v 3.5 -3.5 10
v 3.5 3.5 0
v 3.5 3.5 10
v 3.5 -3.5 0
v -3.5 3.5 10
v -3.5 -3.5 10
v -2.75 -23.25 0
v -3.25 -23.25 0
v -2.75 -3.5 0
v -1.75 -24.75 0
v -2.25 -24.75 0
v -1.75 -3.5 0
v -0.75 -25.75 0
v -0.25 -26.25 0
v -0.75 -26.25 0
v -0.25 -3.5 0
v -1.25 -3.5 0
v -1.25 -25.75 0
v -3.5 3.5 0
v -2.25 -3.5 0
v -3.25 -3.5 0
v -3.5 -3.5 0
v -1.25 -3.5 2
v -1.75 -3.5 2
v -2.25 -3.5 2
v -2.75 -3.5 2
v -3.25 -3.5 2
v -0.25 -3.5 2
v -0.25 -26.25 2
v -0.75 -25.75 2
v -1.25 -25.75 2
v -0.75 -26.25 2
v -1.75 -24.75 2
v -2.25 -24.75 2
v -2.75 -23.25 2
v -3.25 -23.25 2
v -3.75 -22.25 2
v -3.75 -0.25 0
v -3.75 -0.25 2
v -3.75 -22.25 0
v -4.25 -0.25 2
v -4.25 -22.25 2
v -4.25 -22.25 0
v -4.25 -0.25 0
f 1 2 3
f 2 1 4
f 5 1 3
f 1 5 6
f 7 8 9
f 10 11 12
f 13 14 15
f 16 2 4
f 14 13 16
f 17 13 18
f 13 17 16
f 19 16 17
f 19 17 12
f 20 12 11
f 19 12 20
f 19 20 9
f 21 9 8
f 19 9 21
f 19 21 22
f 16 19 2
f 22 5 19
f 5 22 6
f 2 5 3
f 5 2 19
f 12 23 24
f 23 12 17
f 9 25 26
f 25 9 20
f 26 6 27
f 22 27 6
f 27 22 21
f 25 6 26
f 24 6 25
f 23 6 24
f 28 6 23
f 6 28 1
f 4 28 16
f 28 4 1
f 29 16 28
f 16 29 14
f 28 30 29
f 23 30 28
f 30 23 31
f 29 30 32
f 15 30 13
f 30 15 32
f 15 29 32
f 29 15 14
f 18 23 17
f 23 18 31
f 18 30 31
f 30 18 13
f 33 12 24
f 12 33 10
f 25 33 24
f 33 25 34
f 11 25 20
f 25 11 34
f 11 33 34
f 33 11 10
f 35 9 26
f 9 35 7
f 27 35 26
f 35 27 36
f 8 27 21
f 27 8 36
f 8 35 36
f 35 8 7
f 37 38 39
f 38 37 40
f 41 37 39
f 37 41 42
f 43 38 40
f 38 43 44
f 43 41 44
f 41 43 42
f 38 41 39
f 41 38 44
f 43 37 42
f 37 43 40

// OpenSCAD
translate([0, 0, 5]) color([0,1,0,0.9]) cube([7, 7, 10], center=true);
translate([-0.5, -0.5, 1]) color([1,0,0]) cube([0.5, 0.5, 2], center=true);
translate([-0.5, -1.0, 1]) color([1,0,0]) cube([0.5, 0.5, 2], center=true);
translate([-0.5, -1.5, 1]) color([1,0,0]) cube([0.5, 0.5, 2], center=true);
translate([-0.5, -2.0, 1]) color([1,0,0]) cube([0.5, 0.5, 2], center=true);
translate([-0.5, -2.5, 1]) color([1,0,0]) cube([0.5, 0.5, 2], center=true);
translate([-0.5, -3.0, 1]) color([1,0,0]) cube([0.5, 0.5, 2], center=true);
translate([-0.5, -3.5, 1]) color([1,0,0]) cube([0.5, 0.5, 2], center=true);
translate([-0.5, -4.0, 1]) color([1,0,0]) cube([0.5, 0.5, 2], center=true);
translate([-0.5, -4.5, 1]) color([1,0,0]) cube([0.5, 0.5, 2], center=true);
translate([-0.5, -5.0, 1]) color([1,0,0]) cube([0.5, 0.5, 2], center=true);
translate([-0.5, -5.5, 1]) color([1,0,0]) cube([0.5, 0.5, 2], center=true);
translate([-0.5, -6.0, 1]) color([1,0,0]) cube([0.5, 0.5, 2], center=true);
translate([-0.5, -6.5, 1]) color([1,0,0]) cube([0.5, 0.5, 2], center=true);
translate([-0.5, -7.0, 1]) color([1,0,0]) cube([0.5, 0.5, 2], center=true);
translate([-0.5, -7.5, 1]) color([1,0,0]) cube([0.5, 0.5, 2], center=true);
translate([-0.5, -8.0, 1]) color([1,0,0]) cube([0.5, 0.5, 2], center=true);
translate([-0.5, -8.5, 1]) color([1,0,0]) cube([0.5, 0.5, 2], center=true);
translate([-0.5, -9.0, 1]) color([1,0,0]) cube([0.5, 0.5, 2], center=true);
translate([-0.5, -9.5, 1]) color([1,0,0]) cube([0.5, 0.5, 2], center=true);
translate([-0.5, -10.0, 1]) color([1,0,0]) cube([0.5, 0.5, 2], center=true);
translate([-0.5, -10.5, 1]) color([1,0,0]) cube([0.5, 0.5, 2], center=true);
translate([-0.5, -11.0, 1]) color([1,0,0]) cube([0.5, 0.5, 2], center=true);
translate([-0.5, -11.5, 1]) color([1,0,0]) cube([0.5, 0.5, 2], center=true);
translate([-0.5, -12.0, 1]) color([1,0,0]) cube([0.5, 0.5, 2], center=true);
translate([-0.5, -12.5, 1]) color([1,0,0]) cube([0.5, 0.5, 2], center=true);
translate([-0.5, -13.0, 1]) color([1,0,0]) cube([0.5, 0.5, 2], center=true);
translate([-0.5, -13.5, 1]) color([1,0,0]) cube([0.5, 0.5, 2], center=true);
translate([-0.5, -14.0, 1]) color([1,0,0]) cube([0.5, 0.5, 2], center=true);
translate([-0.5, -14.5, 1]) color([1,0,0]) cube([0.5, 0.5, 2], center=true);
translate([-0.5, -15.0, 1]) color([1,0,0]) cube([0.5, 0.5, 2], center=true);
translate([-0.5, -15.5, 1]) color([1,0,0]) cube([0.5, 0.5, 2], center=true);
translate([-0.5, -16.0, 1]) color([1,0,0]) cube([0.5, 0.5, 2], center=true);
translate([-0.5, -16.5, 1]) color([1,0,0]) cube([0.5, 0.5, 2], center=true);
translate([-0.5, -17.0, 1]) color([1,0,0]) cube([0.5, 0.5, 2], center=true);
translate([-0.5, -17.5, 1]) color([1,0,0]) cube([0.5, 0.5, 2], center=true);
translate([-0.5, -18.0, 1]) color([1,0,0]) cube([0.5, 0.5, 2], center=true);
translate([-0.5, -18.5, 1]) color([1,0,0]) cube([0.5, 0.5, 2], center=true);
translate([-0.5, -19.0, 1]) color([1,0,0]) cube([0.5, 0.5, 2], center=true);
translate([-0.5, -19.5, 1]) color([1,0,0]) cube([0.5, 0.5, 2], center=true);
translate([-0.5, -20.0, 1]) color([1,0,0]) cube([0.5, 0.5, 2], center=true);
translate([-0.5, -20.5, 1]) color([1,0,0]) cube([0.5, 0.5, 2], center=true);
translate([-0.5, -21.0, 1]) color([1,0,0]) cube([0.5, 0.5, 2], center=true);
translate([-0.5, -21.5, 1]) color([1,0,0]) cube([0.5, 0.5, 2], center=true);
translate([-0.5, -22.0, 1]) color([1,0,0]) cube([0.5, 0.5, 2], center=true);
translate([-0.5, -22.5, 1]) color([1,0,0]) cube([0.5, 0.5, 2], center=true);
translate([-0.5, -23.0, 1]) color([1,0,0]) cube([0.5, 0.5, 2], center=true);
translate([-0.5, -23.5, 1]) color([1,0,0]) cube([0.5, 0.5, 2], center=true);
translate([-0.5, -24.0, 1]) color([1,0,0]) cube([0.5, 0.5, 2], center=true);
translate([-0.5, -24.5, 1]) color([1,0,0]) cube([0.5, 0.5, 2], center=true);
translate([-0.5, -25.0, 1]) color([1,0,0]) cube([0.5, 0.5, 2], center=true);
translate([-0.5, -25.5, 1]) color([1,0,0]) cube([0.5, 0.5, 2], center=true);
translate([-0.5, -26.0, 1]) color([1,0,0]) cube([0.5, 0.5, 2], center=true);
translate([-1.0, -0.5, 1]) color([1,0,0]) cube([0.5, 0.5, 2], center=true);
translate([-1.0, -1.0, 1]) color([1,0,0]) cube([0.5, 0.5, 2], center=true);
translate([-1.0, -1.5, 1]) color([1,0,0]) cube([0.5, 0.5, 2], center=true);
translate([-1.0, -2.0, 1]) color([1,0,0]) cube([0.5, 0.5, 2], center=true);
translate([-1.0, -2.5, 1]) color([1,0,0]) cube([0.5, 0.5, 2], center=true);
translate([-1.0, -3.0, 1]) color([1,0,0]) cube([0.5, 0.5, 2], center=true);
translate([-1.0, -3.5, 1]) color([1,0,0]) cube([0.5, 0.5, 2], center=true);
translate([-1.0, -4.0, 1]) color([1,0,0]) cube([0.5, 0.5, 2], center=true);
translate([-1.0, -4.5, 1]) color([1,0,0]) cube([0.5, 0.5, 2], center=true);
translate([-1.0, -5.0, 1]) color([1,0,0]) cube([0.5, 0.5, 2], center=true);
translate([-1.0, -5.5, 1]) color([1,0,0]) cube([0.5, 0.5, 2], center=true);
translate([-1.0, -6.0, 1]) color([1,0,0]) cube([0.5, 0.5, 2], center=true);
translate([-1.0, -6.5, 1]) color([1,0,0]) cube([0.5, 0.5, 2], center=true);
translate([-1.0, -7.0, 1]) color([1,0,0]) cube([0.5, 0.5, 2], center=true);
translate([-1.0, -7.5, 1]) color([1,0,0]) cube([0.5, 0.5, 2], center=true);
translate([-1.0, -8.0, 1]) color([1,0,0]) cube([0.5, 0.5, 2], center=true);
translate([-1.0, -8.5, 1]) color([1,0,0]) cube([0.5, 0.5, 2], center=true);
translate([-1.0, -9.0, 1]) color([1,0,0]) cube([0.5, 0.5, 2], center=true);
translate([-1.0, -9.5, 1]) color([1,0,0]) cube([0.5, 0.5, 2], center=true);
translate([-1.0, -10.0, 1]) color([1,0,0]) cube([0.5, 0.5, 2], center=true);
translate([-1.0, -10.5, 1]) color([1,0,0]) cube([0.5, 0.5, 2], center=true);
translate([-1.0, -11.0, 1]) color([1,0,0]) cube([0.5, 0.5, 2], center=true);
translate([-1.0, -11.5, 1]) color([1,0,0]) cube([0.5, 0.5, 2], center=true);
translate([-1.0, -12.0, 1]) color([1,0,0]) cube([0.5, 0.5, 2], center=true);
translate([-1.0, -12.5, 1]) color([1,0,0]) cube([0.5, 0.5, 2], center=true);
translate([-1.0, -13.0, 1]) color([1,0,0]) cube([0.5, 0.5, 2], center=true);
translate([-1.0, -13.5, 1]) color([1,0,0]) cube([0.5, 0.5, 2], center=true);
translate([-1.0, -14.0, 1]) color([1,0,0]) cube([0.5, 0.5, 2], center=true);
translate([-1.0, -14.5, 1]) color([1,0,0]) cube([0.5, 0.5, 2], center=true);
translate([-1.0, -15.0, 1]) color([1,0,0]) cube([0.5, 0.5, 2], center=true);
translate([-1.0, -15.5, 1]) color([1,0,0]) cube([0.5, 0.5, 2], center=true);
translate([-1.0, -16.0, 1]) color([1,0,0]) cube([0.5, 0.5, 2], center=true);
translate([-1.0, -16.5, 1]) color([1,0,0]) cube([0.5, 0.5, 2], center=true);
translate([-1.0, -17.0, 1]) color([1,0,0]) cube([0.5, 0.5, 2], center=true);
translate([-1.0, -17.5, 1]) color([1,0,0]) cube([0.5, 0.5, 2], center=true);
translate([-1.0, -18.0, 1]) color([1,0,0]) cube([0.5, 0.5, 2], center=true);
translate([-1.0, -18.5, 1]) color([1,0,0]) cube([0.5, 0.5, 2], center=true);
translate([-1.0, -19.0, 1]) color([1,0,0]) cube([0.5, 0.5, 2], center=true);
translate([-1.0, -19.5, 1]) color([1,0,0]) cube([0.5, 0.5, 2], center=true);
translate([-1.0, -20.0, 1]) color([1,0,0]) cube([0.5, 0.5, 2], center=true);
translate([-1.0, -20.5, 1]) color([1,0,0]) cube([0.5, 0.5, 2], center=true);
translate([-1.0, -21.0, 1]) color([1,0,0]) cube([0.5, 0.5, 2], center=true);
translate([-1.0, -21.5, 1]) color([1,0,0]) cube([0.5, 0.5, 2], center=true);
translate([-1.0, -22.0, 1]) color([1,0,0]) cube([0.5, 0.5, 2], center=true);
translate([-1.0, -22.5, 1]) color([1,0,0]) cube([0.5, 0.5, 2], center=true);
translate([-1.0, -23.0, 1]) color([1,0,0]) cube([0.5, 0.5, 2], center=true);
translate([-1.0, -23.5, 1]) color([1,0,0]) cube([0.5, 0.5, 2], center=true);
translate([-1.0, -24.0, 1]) color([1,0,0]) cube([0.5, 0.5, 2], center=true);
translate([-1.0, -24.5, 1]) color([1,0,0]) cube([0.5, 0.5, 2], center=true);
translate([-1.0, -25.0, 1]) color([1,0,0]) cube([0.5, 0.5, 2], center=true);
translate([-1.0, -25.5, 1]) color([1,0,0]) cube([0.5, 0.5, 2], center=true);
translate([-2.0, -0.5, 1]) color([1,0,0]) cube([0.5, 0.5, 2], center=true);
translate([-2.0, -1.0, 1]) color([1,0,0]) cube([0.5, 0.5, 2], center=true);
translate([-2.0, -1.5, 1]) color([1,0,0]) cube([0.5, 0.5, 2], center=true);
translate([-2.0, -2.0, 1]) color([1,0,0]) cube([0.5, 0.5, 2], center=true);
translate([-2.0, -2.5, 1]) color([1,0,0]) cube([0.5, 0.5, 2], center=true);
translate([-2.0, -3.0, 1]) color([1,0,0]) cube([0.5, 0.5, 2], center=true);
translate([-2.0, -3.5, 1]) color([1,0,0]) cube([0.5, 0.5, 2], center=true);
translate([-2.0, -4.0, 1]) color([1,0,0]) cube([0.5, 0.5, 2], center=true);
translate([-2.0, -4.5, 1]) color([1,0,0]) cube([0.5, 0.5, 2], center=true);
translate([-2.0, -5.0, 1]) color([1,0,0]) cube([0.5, 0.5, 2], center=true);
translate([-2.0, -5.5, 1]) color([1,0,0]) cube([0.5, 0.5, 2], center=true);
translate([-2.0, -6.0, 1]) color([1,0,0]) cube([0.5, 0.5, 2], center=true);
translate([-2.0, -6.5, 1]) color([1,0,0]) cube([0.5, 0.5, 2], center=true);
translate([-2.0, -7.0, 1]) color([1,0,0]) cube([0.5, 0.5, 2], center=true);
translate([-2.0, -7.5, 1]) color([1,0,0]) cube([0.5, 0.5, 2], center=true);
translate([-2.0, -8.0, 1]) color([1,0,0]) cube([0.5, 0.5, 2], center=true);
translate([-2.0, -8.5, 1]) color([1,0,0]) cube([0.5, 0.5, 2], center=true);
translate([-2.0, -9.0, 1]) color([1,0,0]) cube([0.5, 0.5, 2], center=true);
translate([-2.0, -9.5, 1]) color([1,0,0]) cube([0.5, 0.5, 2], center=true);
translate([-2.0, -10.0, 1]) color([1,0,0]) cube([0.5, 0.5, 2], center=true);
translate([-2.0, -10.5, 1]) color([1,0,0]) cube([0.5, 0.5, 2], center=true);
translate([-2.0, -11.0, 1]) color([1,0,0]) cube([0.5, 0.5, 2], center=true);
translate([-2.0, -11.5, 1]) color([1,0,0]) cube([0.5, 0.5, 2], center=true);
translate([-2.0, -12.0, 1]) color([1,0,0]) cube([0.5, 0.5, 2], center=true);
translate([-2.0, -12.5, 1]) color([1,0,0]) cube([0.5, 0.5, 2], center=true);
translate([-2.0, -13.0, 1]) color([1,0,0]) cube([0.5, 0.5, 2], center=true);
translate([-2.0, -13.5, 1]) color([1,0,0]) cube([0.5, 0.5, 2], center=true);
translate([-2.0, -14.0, 1]) color([1,0,0]) cube([0.5, 0.5, 2], center=true);
translate([-2.0, -14.5, 1]) color([1,0,0]) cube([0.5, 0.5, 2], center=true);
translate([-2.0, -15.0, 1]) color([1,0,0]) cube([0.5, 0.5, 2], center=true);
translate([-2.0, -15.5, 1]) color([1,0,0]) cube([0.5, 0.5, 2], center=true);
translate([-2.0, -16.0, 1]) color([1,0,0]) cube([0.5, 0.5, 2], center=true);
translate([-2.0, -16.5, 1]) color([1,0,0]) cube([0.5, 0.5, 2], center=true);
translate([-2.0, -17.0, 1]) color([1,0,0]) cube([0.5, 0.5, 2], center=true);
translate([-2.0, -17.5, 1]) color([1,0,0]) cube([0.5, 0.5, 2], center=true);
translate([-2.0, -18.0, 1]) color([1,0,0]) cube([0.5, 0.5, 2], center=true);
translate([-2.0, -18.5, 1]) color([1,0,0]) cube([0.5, 0.5, 2], center=true);
translate([-2.0, -19.0, 1]) color([1,0,0]) cube([0.5, 0.5, 2], center=true);
translate([-2.0, -19.5, 1]) color([1,0,0]) cube([0.5, 0.5, 2], center=true);
translate([-2.0, -20.0, 1]) color([1,0,0]) cube([0.5, 0.5, 2], center=true);
translate([-2.0, -20.5, 1]) color([1,0,0]) cube([0.5, 0.5, 2], center=true);
translate([-2.0, -21.0, 1]) color([1,0,0]) cube([0.5, 0.5, 2], center=true);
translate([-2.0, -21.5, 1]) color([1,0,0]) cube([0.5, 0.5, 2], center=true);
translate([-2.0, -22.0, 1]) color([1,0,0]) cube([0.5, 0.5, 2], center=true);
translate([-2.0, -22.5, 1]) color([1,0,0]) cube([0.5, 0.5, 2], center=true);
translate([-2.0, -23.0, 1]) color([1,0,0]) cube([0.5, 0.5, 2], center=true);
translate([-2.0, -23.5, 1]) color([1,0,0]) cube([0.5, 0.5, 2], center=true);
translate([-2.0, -24.0, 1]) color([1,0,0]) cube([0.5, 0.5, 2], center=true);
translate([-2.0, -24.5, 1]) color([1,0,0]) cube([0.5, 0.5, 2], center=true);
translate([-3.0, -0.5, 1]) color([1,0,0]) cube([0.5, 0.5, 2], center=true);
translate([-3.0, -1.0, 1]) color([1,0,0]) cube([0.5, 0.5, 2], center=true);
translate([-3.0, -1.5, 1]) color([1,0,0]) cube([0.5, 0.5, 2], center=true);
translate([-3.0, -2.0, 1]) color([1,0,0]) cube([0.5, 0.5, 2], center=true);
translate([-3.0, -2.5, 1]) color([1,0,0]) cube([0.5, 0.5, 2], center=true);
translate([-3.0, -3.0, 1]) color([1,0,0]) cube([0.5, 0.5, 2], center=true);
translate([-3.0, -3.5, 1]) color([1,0,0]) cube([0.5, 0.5, 2], center=true);
translate([-3.0, -4.0, 1]) color([1,0,0]) cube([0.5, 0.5, 2], center=true);
translate([-3.0, -4.5, 1]) color([1,0,0]) cube([0.5, 0.5, 2], center=true);
translate([-3.0, -5.0, 1]) color([1,0,0]) cube([0.5, 0.5, 2], center=true);
translate([-3.0, -5.5, 1]) color([1,0,0]) cube([0.5, 0.5, 2], center=true);
translate([-3.0, -6.0, 1]) color([1,0,0]) cube([0.5, 0.5, 2], center=true);
translate([-3.0, -6.5, 1]) color([1,0,0]) cube([0.5, 0.5, 2], center=true);
translate([-3.0, -7.0, 1]) color([1,0,0]) cube([0.5, 0.5, 2], center=true);
translate([-3.0, -7.5, 1]) color([1,0,0]) cube([0.5, 0.5, 2], center=true);
translate([-3.0, -8.0, 1]) color([1,0,0]) cube([0.5, 0.5, 2], center=true);
translate([-3.0, -8.5, 1]) color([1,0,0]) cube([0.5, 0.5, 2], center=true);
translate([-3.0, -9.0, 1]) color([1,0,0]) cube([0.5, 0.5, 2], center=true);
translate([-3.0, -9.5, 1]) color([1,0,0]) cube([0.5, 0.5, 2], center=true);
translate([-3.0, -10.0, 1]) color([1,0,0]) cube([0.5, 0.5, 2], center=true);
translate([-3.0, -10.5, 1]) color([1,0,0]) cube([0.5, 0.5, 2], center=true);
translate([-3.0, -11.0, 1]) color([1,0,0]) cube([0.5, 0.5, 2], center=true);
translate([-3.0, -11.5, 1]) color([1,0,0]) cube([0.5, 0.5, 2], center=true);
translate([-3.0, -12.0, 1]) color([1,0,0]) cube([0.5, 0.5, 2], center=true);
translate([-3.0, -12.5, 1]) color([1,0,0]) cube([0.5, 0.5, 2], center=true);
translate([-3.0, -13.0, 1]) color([1,0,0]) cube([0.5, 0.5, 2], center=true);
translate([-3.0, -13.5, 1]) color([1,0,0]) cube([0.5, 0.5, 2], center=true);
translate([-3.0, -14.0, 1]) color([1,0,0]) cube([0.5, 0.5, 2], center=true);
translate([-3.0, -14.5, 1]) color([1,0,0]) cube([0.5, 0.5, 2], center=true);
translate([-3.0, -15.0, 1]) color([1,0,0]) cube([0.5, 0.5, 2], center=true);
translate([-3.0, -15.5, 1]) color([1,0,0]) cube([0.5, 0.5, 2], center=true);
translate([-3.0, -16.0, 1]) color([1,0,0]) cube([0.5, 0.5, 2], center=true);
translate([-3.0, -16.5, 1]) color([1,0,0]) cube([0.5, 0.5, 2], center=true);
translate([-3.0, -17.0, 1]) color([1,0,0]) cube([0.5, 0.5, 2], center=true);
translate([-3.0, -17.5, 1]) color([1,0,0]) cube([0.5, 0.5, 2], center=true);
translate([-3.0, -18.0, 1]) color([1,0,0]) cube([0.5, 0.5, 2], center=true);
translate([-3.0, -18.5, 1]) color([1,0,0]) cube([0.5, 0.5, 2], center=true);
translate([-3.0, -19.0, 1]) color([1,0,0]) cube([0.5, 0.5, 2], center=true);
translate([-3.0, -19.5, 1]) color([1,0,0]) cube([0.5, 0.5, 2], center=true);
translate([-3.0, -20.0, 1]) color([1,0,0]) cube([0.5, 0.5, 2], center=true);
translate([-3.0, -20.5, 1]) color([1,0,0]) cube([0.5, 0.5, 2], center=true);
translate([-3.0, -21.0, 1]) color([1,0,0]) cube([0.5, 0.5, 2], center=true);
translate([-3.0, -21.5, 1]) color([1,0,0]) cube([0.5, 0.5, 2], center=true);
translate([-3.0, -22.0, 1]) color([1,0,0]) cube([0.5, 0.5, 2], center=true);
translate([-3.0, -22.5, 1]) color([1,0,0]) cube([0.5, 0.5, 2], center=true);
translate([-3.0, -23.0, 1]) color([1,0,0]) cube([0.5, 0.5, 2], center=true);
translate([-4.0, -0.5, 1]) color([1,0,0]) cube([0.5, 0.5, 2], center=true);
translate([-4.0, -1.0, 1]) color([1,0,0]) cube([0.5, 0.5, 2], center=true);
translate([-4.0, -1.5, 1]) color([1,0,0]) cube([0.5, 0.5, 2], center=true);
translate([-4.0, -2.0, 1]) color([1,0,0]) cube([0.5, 0.5, 2], center=true);
translate([-4.0, -2.5, 1]) color([1,0,0]) cube([0.5, 0.5, 2], center=true);
translate([-4.0, -3.0, 1]) color([1,0,0]) cube([0.5, 0.5, 2], center=true);
translate([-4.0, -3.5, 1]) color([1,0,0]) cube([0.5, 0.5, 2], center=true);
translate([-4.0, -4.0, 1]) color([1,0,0]) cube([0.5, 0.5, 2], center=true);
translate([-4.0, -4.5, 1]) color([1,0,0]) cube([0.5, 0.5, 2], center=true);
translate([-4.0, -5.0, 1]) color([1,0,0]) cube([0.5, 0.5, 2], center=true);
translate([-4.0, -5.5, 1]) color([1,0,0]) cube([0.5, 0.5, 2], center=true);
translate([-4.0, -6.0, 1]) color([1,0,0]) cube([0.5, 0.5, 2], center=true);
translate([-4.0, -6.5, 1]) color([1,0,0]) cube([0.5, 0.5, 2], center=true);
translate([-4.0, -7.0, 1]) color([1,0,0]) cube([0.5, 0.5, 2], center=true);
translate([-4.0, -7.5, 1]) color([1,0,0]) cube([0.5, 0.5, 2], center=true);
translate([-4.0, -8.0, 1]) color([1,0,0]) cube([0.5, 0.5, 2], center=true);
translate([-4.0, -8.5, 1]) color([1,0,0]) cube([0.5, 0.5, 2], center=true);
translate([-4.0, -9.0, 1]) color([1,0,0]) cube([0.5, 0.5, 2], center=true);
translate([-4.0, -9.5, 1]) color([1,0,0]) cube([0.5, 0.5, 2], center=true);
translate([-4.0, -10.0, 1]) color([1,0,0]) cube([0.5, 0.5, 2], center=true);
translate([-4.0, -10.5, 1]) color([1,0,0]) cube([0.5, 0.5, 2], center=true);
translate([-4.0, -11.0, 1]) color([1,0,0]) cube([0.5, 0.5, 2], center=true);
translate([-4.0, -11.5, 1]) color([1,0,0]) cube([0.5, 0.5, 2], center=true);
translate([-4.0, -12.0, 1]) color([1,0,0]) cube([0.5, 0.5, 2], center=true);
translate([-4.0, -12.5, 1]) color([1,0,0]) cube([0.5, 0.5, 2], center=true);
translate([-4.0, -13.0, 1]) color([1,0,0]) cube([0.5, 0.5, 2], center=true);
translate([-4.0, -13.5, 1]) color([1,0,0]) cube([0.5, 0.5, 2], center=true);
translate([-4.0, -14.0, 1]) color([1,0,0]) cube([0.5, 0.5, 2], center=true);
translate([-4.0, -14.5, 1]) color([1,0,0]) cube([0.5, 0.5, 2], center=true);
translate([-4.0, -15.0, 1]) color([1,0,0]) cube([0.5, 0.5, 2], center=true);
translate([-4.0, -15.5, 1]) color([1,0,0]) cube([0.5, 0.5, 2], center=true);
translate([-4.0, -16.0, 1]) color([1,0,0]) cube([0.5, 0.5, 2], center=true);
translate([-4.0, -16.5, 1]) color([1,0,0]) cube([0.5, 0.5, 2], center=true);
translate([-4.0, -17.0, 1]) color([1,0,0]) cube([0.5, 0.5, 2], center=true);
translate([-4.0, -17.5, 1]) color([1,0,0]) cube([0.5, 0.5, 2], center=true);
translate([-4.0, -18.0, 1]) color([1,0,0]) cube([0.5, 0.5, 2], center=true);
translate([-4.0, -18.5, 1]) color([1,0,0]) cube([0.5, 0.5, 2], center=true);
translate([-4.0, -19.0, 1]) color([1,0,0]) cube([0.5, 0.5, 2], center=true);
translate([-4.0, -19.5, 1]) color([1,0,0]) cube([0.5, 0.5, 2], center=true);
translate([-4.0, -20.0, 1]) color([1,0,0]) cube([0.5, 0.5, 2], center=true);
translate([-4.0, -20.5, 1]) color([1,0,0]) cube([0.5, 0.5, 2], center=true);
translate([-4.0, -21.0, 1]) color([1,0,0]) cube([0.5, 0.5, 2], center=true);
translate([-4.0, -21.5, 1]) color([1,0,0]) cube([0.5, 0.5, 2], center=true);
translate([-4.0, -22.0, 1]) color([1,0,0]) cube([0.5, 0.5, 2], center=true);
